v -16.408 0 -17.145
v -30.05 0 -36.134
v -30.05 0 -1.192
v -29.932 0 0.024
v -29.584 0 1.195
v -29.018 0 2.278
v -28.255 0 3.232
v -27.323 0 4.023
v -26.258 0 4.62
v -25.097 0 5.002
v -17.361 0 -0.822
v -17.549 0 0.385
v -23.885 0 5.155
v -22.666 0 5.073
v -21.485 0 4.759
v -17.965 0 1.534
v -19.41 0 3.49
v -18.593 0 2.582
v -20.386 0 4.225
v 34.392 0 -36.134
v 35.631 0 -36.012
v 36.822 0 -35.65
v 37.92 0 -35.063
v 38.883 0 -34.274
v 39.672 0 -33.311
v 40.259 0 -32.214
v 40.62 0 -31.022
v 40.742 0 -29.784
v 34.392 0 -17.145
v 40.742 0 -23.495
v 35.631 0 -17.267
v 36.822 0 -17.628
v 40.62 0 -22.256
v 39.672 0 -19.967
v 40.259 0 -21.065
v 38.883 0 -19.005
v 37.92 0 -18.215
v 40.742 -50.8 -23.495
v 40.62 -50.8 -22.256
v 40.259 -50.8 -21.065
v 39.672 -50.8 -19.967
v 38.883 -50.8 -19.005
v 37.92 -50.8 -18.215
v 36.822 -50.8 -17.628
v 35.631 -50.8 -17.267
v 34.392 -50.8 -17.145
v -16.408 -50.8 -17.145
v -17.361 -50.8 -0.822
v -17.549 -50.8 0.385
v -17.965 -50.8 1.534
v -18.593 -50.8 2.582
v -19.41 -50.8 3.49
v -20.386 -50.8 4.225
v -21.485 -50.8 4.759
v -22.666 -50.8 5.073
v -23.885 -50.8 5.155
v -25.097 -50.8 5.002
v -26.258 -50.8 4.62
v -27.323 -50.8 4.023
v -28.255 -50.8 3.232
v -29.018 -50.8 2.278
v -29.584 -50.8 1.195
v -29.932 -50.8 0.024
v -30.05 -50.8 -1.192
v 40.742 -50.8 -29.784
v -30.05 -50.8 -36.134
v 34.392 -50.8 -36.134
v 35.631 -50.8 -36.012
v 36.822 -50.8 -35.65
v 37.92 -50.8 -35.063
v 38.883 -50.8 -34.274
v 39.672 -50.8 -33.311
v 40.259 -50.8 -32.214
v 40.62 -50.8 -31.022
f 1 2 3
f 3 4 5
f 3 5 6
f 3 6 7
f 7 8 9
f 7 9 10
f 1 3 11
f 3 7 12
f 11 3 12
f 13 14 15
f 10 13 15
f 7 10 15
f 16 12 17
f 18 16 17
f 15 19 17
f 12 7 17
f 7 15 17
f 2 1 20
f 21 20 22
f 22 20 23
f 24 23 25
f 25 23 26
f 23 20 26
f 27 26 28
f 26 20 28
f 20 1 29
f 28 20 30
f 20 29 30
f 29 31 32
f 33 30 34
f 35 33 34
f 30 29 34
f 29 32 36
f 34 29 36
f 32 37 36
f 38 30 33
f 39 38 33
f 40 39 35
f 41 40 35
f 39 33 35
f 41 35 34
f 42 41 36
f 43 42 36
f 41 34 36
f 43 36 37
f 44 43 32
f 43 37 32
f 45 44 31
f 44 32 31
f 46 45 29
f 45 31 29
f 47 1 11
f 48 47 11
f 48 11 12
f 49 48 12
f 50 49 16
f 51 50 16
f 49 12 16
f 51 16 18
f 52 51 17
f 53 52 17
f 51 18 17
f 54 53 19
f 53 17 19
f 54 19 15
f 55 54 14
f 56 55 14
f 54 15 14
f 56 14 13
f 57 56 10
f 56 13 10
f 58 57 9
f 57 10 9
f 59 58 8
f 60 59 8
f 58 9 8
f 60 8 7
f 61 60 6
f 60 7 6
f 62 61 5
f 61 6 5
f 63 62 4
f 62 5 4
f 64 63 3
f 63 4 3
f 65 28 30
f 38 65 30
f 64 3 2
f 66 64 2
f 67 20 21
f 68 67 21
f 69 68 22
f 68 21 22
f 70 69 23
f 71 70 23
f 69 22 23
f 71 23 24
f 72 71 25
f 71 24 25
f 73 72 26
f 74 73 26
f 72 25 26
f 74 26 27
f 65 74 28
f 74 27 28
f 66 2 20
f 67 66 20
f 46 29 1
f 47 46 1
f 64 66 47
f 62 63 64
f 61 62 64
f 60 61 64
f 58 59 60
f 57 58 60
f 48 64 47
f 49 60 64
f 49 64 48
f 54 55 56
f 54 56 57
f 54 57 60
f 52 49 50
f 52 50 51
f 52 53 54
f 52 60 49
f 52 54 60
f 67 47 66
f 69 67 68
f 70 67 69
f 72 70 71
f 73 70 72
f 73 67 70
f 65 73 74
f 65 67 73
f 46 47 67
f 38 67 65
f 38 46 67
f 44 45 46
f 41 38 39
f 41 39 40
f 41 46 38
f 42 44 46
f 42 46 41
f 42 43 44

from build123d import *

# Parameters (mm, degrees)
F1_DEPTH = 50.8


with BuildPart() as f1:
    # F0 (on Front) → F1 (new body)
    with BuildSketch(Plane.XZ):
        with BuildLine():
            ThreePointArc((-17.360634, -0.82199), (-23.884981, 5.155183), (-30.049838, -1.192117))
            Line((-30.049838, -1.192117), (-30.049838, -36.133546))
            Line((-30.049838, -36.133546), (34.392419, -36.133546))
            ThreePointArc((34.392419, -36.133546), (38.882547, -34.273674), (40.742419, -29.783546))
            Line((40.742419, -29.783546), (40.742419, -23.495))
            ThreePointArc((40.742419, -23.495), (38.882547, -19.004872), (34.392419, -17.145))
            Line((34.392419, -17.145), (-16.407581, -17.145))
            Line((-16.407581, -17.145), (-17.360634, -0.82199))
        make_face()
    extrude(amount=F1_DEPTH)


solid = f1.part
